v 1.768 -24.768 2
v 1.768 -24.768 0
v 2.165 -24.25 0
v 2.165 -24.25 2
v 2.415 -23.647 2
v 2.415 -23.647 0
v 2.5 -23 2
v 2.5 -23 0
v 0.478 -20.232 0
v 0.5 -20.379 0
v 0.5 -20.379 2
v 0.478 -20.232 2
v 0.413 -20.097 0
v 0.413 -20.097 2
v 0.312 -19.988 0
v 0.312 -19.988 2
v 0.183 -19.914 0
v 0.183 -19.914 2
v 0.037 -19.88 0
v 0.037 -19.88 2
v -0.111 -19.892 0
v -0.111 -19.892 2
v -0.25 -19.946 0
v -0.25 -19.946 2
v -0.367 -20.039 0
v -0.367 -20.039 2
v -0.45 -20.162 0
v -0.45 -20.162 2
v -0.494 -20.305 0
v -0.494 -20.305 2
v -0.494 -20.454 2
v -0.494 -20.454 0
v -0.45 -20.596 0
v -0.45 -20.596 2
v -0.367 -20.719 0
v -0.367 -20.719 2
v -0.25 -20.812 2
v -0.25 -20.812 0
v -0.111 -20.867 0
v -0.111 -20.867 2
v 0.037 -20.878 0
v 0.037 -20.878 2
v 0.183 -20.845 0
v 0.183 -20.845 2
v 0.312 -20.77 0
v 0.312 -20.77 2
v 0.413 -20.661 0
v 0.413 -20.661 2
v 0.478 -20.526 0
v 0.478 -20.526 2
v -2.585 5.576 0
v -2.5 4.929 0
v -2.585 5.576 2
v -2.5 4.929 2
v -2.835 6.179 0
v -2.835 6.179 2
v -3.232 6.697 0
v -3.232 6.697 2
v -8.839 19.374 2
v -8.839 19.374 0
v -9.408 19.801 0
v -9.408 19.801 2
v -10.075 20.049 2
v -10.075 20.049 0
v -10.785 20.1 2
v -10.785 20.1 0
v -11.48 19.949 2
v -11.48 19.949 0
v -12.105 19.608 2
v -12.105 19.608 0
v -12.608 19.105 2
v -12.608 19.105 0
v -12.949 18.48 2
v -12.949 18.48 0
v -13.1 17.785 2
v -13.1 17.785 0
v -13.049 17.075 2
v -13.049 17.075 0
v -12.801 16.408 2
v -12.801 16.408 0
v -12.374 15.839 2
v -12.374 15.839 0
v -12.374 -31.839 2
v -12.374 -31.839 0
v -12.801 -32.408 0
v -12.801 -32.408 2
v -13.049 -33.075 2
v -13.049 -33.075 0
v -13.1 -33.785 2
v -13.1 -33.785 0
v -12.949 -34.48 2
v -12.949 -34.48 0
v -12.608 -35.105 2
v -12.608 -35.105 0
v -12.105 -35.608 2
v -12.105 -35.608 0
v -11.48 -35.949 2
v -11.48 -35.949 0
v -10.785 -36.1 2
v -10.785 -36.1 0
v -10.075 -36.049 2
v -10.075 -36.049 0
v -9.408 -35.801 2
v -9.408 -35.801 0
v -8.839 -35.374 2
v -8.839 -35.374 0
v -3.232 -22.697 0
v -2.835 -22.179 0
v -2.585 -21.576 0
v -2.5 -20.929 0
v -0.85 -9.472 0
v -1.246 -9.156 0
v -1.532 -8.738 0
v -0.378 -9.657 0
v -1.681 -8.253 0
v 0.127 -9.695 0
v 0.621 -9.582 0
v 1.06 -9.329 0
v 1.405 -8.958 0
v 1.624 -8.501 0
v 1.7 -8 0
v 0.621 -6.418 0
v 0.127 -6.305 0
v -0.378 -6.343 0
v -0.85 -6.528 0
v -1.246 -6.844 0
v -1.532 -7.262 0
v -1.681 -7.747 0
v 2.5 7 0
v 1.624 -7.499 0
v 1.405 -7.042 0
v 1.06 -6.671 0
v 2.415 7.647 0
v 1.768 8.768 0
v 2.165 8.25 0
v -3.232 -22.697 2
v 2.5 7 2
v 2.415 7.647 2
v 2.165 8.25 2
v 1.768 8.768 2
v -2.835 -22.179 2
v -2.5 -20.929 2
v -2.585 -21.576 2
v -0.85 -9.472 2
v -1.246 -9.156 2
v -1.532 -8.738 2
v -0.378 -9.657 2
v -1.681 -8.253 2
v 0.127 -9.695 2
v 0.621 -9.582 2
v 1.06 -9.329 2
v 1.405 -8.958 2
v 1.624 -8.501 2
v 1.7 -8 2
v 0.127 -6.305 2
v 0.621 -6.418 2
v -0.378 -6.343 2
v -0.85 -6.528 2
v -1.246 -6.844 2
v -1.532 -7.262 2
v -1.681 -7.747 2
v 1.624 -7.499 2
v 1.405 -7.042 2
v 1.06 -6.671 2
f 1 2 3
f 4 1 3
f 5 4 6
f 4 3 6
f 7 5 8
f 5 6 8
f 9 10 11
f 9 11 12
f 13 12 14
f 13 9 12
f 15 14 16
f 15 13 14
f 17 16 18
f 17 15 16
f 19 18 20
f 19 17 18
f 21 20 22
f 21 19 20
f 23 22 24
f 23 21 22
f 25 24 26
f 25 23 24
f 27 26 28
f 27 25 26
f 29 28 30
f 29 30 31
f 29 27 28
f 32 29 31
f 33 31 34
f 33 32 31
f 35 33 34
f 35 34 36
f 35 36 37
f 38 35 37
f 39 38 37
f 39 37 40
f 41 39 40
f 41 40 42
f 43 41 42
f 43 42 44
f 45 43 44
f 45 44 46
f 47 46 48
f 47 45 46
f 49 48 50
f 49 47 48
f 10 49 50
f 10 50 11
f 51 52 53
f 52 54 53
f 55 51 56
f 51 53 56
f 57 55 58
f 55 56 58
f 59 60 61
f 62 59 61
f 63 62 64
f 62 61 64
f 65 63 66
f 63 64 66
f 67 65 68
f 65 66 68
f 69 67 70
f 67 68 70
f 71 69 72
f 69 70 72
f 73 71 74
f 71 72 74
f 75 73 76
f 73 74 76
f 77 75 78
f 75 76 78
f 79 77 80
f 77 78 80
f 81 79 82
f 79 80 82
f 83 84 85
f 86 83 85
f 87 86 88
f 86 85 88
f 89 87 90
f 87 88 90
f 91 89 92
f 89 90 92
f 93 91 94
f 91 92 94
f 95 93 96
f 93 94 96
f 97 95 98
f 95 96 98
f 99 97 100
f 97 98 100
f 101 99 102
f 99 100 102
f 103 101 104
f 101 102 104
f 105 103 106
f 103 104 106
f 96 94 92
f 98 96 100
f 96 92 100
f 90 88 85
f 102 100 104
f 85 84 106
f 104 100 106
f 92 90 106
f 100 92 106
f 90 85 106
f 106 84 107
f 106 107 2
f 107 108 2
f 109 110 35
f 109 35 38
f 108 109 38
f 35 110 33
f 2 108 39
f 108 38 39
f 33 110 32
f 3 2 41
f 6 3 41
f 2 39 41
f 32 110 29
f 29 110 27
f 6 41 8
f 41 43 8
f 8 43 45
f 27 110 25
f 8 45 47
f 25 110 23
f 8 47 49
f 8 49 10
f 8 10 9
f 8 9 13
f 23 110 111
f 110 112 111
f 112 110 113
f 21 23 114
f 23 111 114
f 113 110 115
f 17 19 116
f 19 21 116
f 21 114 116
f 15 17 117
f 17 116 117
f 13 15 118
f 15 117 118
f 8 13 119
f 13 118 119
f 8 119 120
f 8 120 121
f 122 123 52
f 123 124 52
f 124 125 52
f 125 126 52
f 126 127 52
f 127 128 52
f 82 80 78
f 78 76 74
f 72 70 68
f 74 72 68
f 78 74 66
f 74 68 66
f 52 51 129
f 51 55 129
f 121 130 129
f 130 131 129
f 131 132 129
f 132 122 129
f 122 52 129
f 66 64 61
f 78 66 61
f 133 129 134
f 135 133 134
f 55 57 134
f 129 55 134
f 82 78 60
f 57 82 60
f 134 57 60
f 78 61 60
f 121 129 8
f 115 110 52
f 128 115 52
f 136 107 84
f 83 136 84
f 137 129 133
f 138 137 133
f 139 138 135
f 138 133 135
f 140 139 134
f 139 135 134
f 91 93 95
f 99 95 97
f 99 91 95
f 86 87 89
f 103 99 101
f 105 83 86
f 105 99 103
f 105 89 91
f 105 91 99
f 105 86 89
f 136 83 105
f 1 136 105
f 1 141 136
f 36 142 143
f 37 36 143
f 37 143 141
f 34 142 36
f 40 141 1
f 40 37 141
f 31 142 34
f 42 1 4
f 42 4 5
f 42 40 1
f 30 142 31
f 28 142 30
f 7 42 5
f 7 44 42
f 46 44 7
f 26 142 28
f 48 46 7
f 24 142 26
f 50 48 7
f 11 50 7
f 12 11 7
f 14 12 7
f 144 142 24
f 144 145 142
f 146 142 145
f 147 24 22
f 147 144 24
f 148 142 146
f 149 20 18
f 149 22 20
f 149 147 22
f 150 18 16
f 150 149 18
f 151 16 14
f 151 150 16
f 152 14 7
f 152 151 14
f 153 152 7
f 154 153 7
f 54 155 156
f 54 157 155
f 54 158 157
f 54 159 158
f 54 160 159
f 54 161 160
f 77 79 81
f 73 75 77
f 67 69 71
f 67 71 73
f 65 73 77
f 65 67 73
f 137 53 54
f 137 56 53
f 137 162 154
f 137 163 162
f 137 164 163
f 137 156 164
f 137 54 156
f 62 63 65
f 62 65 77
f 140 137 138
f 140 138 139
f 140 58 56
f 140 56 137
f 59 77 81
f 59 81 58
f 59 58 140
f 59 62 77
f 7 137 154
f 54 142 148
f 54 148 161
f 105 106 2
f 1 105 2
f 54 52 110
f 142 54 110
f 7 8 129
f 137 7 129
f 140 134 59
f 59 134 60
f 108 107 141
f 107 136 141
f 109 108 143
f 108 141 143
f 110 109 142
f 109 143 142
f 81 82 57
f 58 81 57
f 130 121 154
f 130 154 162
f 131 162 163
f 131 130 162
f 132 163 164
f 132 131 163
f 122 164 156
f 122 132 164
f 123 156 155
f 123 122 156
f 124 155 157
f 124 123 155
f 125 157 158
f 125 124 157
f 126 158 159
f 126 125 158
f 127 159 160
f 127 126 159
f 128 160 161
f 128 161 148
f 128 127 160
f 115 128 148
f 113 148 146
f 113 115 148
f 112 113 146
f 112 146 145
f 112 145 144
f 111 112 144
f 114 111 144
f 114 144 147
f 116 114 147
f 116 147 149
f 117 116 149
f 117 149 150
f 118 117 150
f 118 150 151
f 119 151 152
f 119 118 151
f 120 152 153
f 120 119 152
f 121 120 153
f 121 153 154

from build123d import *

# Parameters (mm, degrees)
SKETCH1_R           = 0.5
SKETCH1_R_2         = 1.7
BOSS_EXTRUDE1_DEPTH = 2
FILLET1_R           = 2.5


with BuildPart() as part:
    # Sketch1 → Boss-Extrude1 (new body)
    with BuildSketch(Plane.XY):
        with BuildLine():
            Line((-8.838834765, -35.374368671), (1.767766953, -24.767766953))
            ThreePointArc((1.767766953, -24.767766953), (2.309698831, -23.956708581), (2.5, -23))
            Line((2.5, -23), (2.5, 7))
            ThreePointArc((2.5, 7), (2.309698831, 7.956708581), (1.767766953, 8.767766953))
            Line((1.767766953, 8.767766953), (-8.838834765, 19.374368671))
            ThreePointArc((-8.838834765, 19.374368671), (-12.374368671, 19.374368671), (-12.374368671, 15.838834765))
            Line((-12.374368671, 15.838834765), (-2.5, 5.964466094))
            Line((-2.5, 5.964466094), (-2.5, -21.964466094))
            Line((-2.5, -21.964466094), (-12.374368671, -31.838834765))
            ThreePointArc((-12.374368671, -31.838834765), (-12.374368671, -35.374368671), (-8.838834765, -35.374368671))
        make_face()
        with Locations((0, -20.379081878)):
            Circle(SKETCH1_R, mode=Mode.SUBTRACT)
        with Locations((0, -8)):
            Circle(SKETCH1_R_2, mode=Mode.SUBTRACT)
    extrude(amount=BOSS_EXTRUDE1_DEPTH)

    # Fillet1
    fillet1_edges = [part.edges().sort_by_distance(p)[0] for p in [
        (-2.5, 5.964466094, 1),
        (-2.5, -21.964466094, 1),
    ]]
    fillet(fillet1_edges, radius=FILLET1_R)


solid = part.part
